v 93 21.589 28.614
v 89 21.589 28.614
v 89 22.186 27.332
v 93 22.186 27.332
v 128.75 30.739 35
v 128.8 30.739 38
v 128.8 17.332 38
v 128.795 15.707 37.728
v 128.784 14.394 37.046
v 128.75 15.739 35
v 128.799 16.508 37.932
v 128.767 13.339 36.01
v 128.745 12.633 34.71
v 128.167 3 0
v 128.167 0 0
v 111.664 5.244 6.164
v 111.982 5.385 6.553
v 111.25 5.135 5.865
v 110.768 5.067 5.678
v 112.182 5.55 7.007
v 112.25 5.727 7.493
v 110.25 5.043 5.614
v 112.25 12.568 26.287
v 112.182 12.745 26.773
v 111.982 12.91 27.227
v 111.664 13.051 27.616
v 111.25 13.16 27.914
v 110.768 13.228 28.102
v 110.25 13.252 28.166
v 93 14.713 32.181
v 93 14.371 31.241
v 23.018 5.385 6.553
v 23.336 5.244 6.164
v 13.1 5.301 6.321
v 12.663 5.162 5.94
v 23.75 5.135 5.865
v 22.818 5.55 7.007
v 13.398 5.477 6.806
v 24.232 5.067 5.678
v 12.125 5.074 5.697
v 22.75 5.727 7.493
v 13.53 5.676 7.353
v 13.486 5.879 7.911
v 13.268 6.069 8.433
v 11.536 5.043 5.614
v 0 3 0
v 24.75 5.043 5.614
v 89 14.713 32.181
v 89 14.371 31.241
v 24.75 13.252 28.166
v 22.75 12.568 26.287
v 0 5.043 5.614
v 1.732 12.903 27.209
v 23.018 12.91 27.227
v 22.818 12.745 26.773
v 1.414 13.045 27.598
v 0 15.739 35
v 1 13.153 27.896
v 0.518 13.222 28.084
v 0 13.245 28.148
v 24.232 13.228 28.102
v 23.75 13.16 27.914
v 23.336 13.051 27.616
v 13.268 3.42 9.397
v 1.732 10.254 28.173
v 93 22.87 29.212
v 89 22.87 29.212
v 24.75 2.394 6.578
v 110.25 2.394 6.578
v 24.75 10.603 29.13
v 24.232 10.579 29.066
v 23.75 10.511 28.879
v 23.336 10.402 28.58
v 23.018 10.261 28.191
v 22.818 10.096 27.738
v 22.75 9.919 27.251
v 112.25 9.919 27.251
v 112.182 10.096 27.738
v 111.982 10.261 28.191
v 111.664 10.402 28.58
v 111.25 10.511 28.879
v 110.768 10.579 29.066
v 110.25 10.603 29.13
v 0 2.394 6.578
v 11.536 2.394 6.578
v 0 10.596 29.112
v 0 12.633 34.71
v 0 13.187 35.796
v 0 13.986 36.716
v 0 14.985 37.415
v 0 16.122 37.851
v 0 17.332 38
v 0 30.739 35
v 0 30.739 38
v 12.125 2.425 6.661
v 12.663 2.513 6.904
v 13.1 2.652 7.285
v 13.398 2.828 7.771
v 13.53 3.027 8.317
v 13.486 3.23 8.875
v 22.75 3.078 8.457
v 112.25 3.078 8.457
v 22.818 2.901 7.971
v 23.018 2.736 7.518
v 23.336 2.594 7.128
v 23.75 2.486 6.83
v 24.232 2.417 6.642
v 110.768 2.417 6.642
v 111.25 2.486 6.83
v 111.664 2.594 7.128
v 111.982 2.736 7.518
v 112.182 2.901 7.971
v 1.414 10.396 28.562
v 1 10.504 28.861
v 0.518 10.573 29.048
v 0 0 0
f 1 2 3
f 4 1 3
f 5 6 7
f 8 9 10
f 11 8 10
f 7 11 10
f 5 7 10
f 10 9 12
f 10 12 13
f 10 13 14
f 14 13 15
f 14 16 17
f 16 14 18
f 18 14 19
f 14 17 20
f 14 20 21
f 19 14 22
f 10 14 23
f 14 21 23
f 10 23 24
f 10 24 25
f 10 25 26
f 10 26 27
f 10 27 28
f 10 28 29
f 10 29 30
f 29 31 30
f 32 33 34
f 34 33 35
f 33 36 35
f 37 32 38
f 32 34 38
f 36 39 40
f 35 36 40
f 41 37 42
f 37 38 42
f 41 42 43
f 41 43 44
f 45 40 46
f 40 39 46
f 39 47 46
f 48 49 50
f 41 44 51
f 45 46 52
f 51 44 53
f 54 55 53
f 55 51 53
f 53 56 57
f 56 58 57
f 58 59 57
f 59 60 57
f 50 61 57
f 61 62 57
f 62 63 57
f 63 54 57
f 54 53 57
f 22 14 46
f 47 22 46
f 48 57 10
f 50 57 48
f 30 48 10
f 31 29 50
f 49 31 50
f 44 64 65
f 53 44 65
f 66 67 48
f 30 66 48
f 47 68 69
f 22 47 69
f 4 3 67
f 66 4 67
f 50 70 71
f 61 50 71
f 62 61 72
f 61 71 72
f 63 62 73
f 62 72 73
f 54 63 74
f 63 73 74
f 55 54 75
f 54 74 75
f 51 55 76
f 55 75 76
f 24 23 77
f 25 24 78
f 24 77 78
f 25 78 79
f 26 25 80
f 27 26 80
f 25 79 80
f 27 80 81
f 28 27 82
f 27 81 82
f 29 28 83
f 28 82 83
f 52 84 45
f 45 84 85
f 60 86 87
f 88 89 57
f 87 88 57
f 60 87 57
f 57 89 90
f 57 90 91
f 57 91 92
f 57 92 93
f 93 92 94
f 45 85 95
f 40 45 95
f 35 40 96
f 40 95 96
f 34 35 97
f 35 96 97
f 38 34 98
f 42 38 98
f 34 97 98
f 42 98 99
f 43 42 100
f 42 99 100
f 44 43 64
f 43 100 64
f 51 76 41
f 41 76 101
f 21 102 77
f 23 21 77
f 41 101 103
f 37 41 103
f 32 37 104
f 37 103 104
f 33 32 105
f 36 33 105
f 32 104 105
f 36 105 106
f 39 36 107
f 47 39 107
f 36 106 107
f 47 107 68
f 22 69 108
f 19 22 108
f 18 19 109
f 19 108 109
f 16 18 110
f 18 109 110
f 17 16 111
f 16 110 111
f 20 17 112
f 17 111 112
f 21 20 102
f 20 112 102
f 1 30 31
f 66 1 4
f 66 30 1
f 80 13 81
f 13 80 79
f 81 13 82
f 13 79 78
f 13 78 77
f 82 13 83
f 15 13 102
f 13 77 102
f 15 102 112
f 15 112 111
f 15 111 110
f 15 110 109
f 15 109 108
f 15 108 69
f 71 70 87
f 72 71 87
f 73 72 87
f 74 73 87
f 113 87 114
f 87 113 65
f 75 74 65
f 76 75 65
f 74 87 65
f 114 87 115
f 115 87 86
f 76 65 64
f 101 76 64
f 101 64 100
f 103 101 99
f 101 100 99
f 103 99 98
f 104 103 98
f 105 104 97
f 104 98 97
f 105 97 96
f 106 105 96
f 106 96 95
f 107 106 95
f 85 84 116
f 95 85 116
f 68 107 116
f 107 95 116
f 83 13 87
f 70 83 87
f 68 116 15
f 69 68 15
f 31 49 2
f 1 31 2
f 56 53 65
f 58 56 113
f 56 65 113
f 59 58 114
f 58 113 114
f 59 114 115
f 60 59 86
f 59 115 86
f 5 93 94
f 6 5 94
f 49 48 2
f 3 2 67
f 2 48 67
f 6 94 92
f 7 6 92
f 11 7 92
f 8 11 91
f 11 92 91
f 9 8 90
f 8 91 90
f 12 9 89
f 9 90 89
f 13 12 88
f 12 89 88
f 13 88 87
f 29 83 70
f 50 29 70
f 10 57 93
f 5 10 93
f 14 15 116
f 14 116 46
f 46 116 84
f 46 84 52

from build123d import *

# Parameters (mm, degrees)
F1_DEPTH = 129
F3_DEPTH = 25
F5_DEPTH = 40
F8_DEPTH = 4


# Not quite as in the source:
# - a feature names something its author has since deleted; it is built from what else it names


with BuildPart() as f1:
    # F0 (on Right) → F1 (new body)
    with BuildSketch(Plane.YZ):
        with BuildLine():
            Line((12.6334434892, 34.7101007166), (0, 0))
            Line((0, 0), (3, 0))
            Line((3, 0), (15.7389581993, 35))
            Line((15.7389581993, 35), (30.7389581993, 35))
            Line((30.7389581993, 35), (30.7389581993, 38))
            Line((30.7389581993, 38), (17.3319065932, 38))
            ThreePointArc((17.3319065932, 38), (14.4640244114, 37.0957602214), (12.6334434892, 34.7101007166))
        make_face()
    extrude(amount=F1_DEPTH)

    # F2 (on face) → F3 (cut)
    with BuildSketch(Plane(origin=(0, 0, 0), x_dir=(1, 0, 0), z_dir=(0, -0.9396926208, 0.3420201433))):
        with BuildLine():
            Line((24.75, 7), (110.25, 7))
            ThreePointArc((110.25, 7), (111.6642135624, 7.5857864376), (112.25, 9))
            Line((112.25, 9), (112.25, 29))
            ThreePointArc((112.25, 29), (111.6642135624, 30.4142135624), (110.25, 31))
            Line((110.25, 31), (24.75, 31))
            ThreePointArc((24.75, 31), (23.3357864376, 30.4142135624), (22.75, 29))
            Line((22.75, 29), (22.75, 9))
            ThreePointArc((22.75, 9), (23.3357864376, 7.5857864376), (24.75, 7))
        make_face()
        with BuildLine():
            ThreePointArc((-13.2679491924, 10), (-13.2679491924, 8), (-11.5358983849, 7))
            Line((-11.5358983849, 7), (0, 7))
            Line((0, 7), (0, 30.9807621135))
            ThreePointArc((0, 30.9807621135), (-1, 30.7128129211), (-1.7320508076, 29.9807621135))
            Line((-1.7320508076, 29.9807621135), (-13.2679491924, 10))
        make_face()
        with BuildLine():
            Line((0, 30.9807621135), (0, 7))
            Line((0, 7), (11.5358983849, 7))
            ThreePointArc((11.5358983849, 7), (13.2679491924, 8), (13.2679491924, 10))
            Line((13.2679491924, 10), (1.7320508076, 29.9807621135))
            ThreePointArc((1.7320508076, 29.9807621135), (1, 30.7128129211), (0, 30.9807621135))
        make_face()
    extrude(amount=-F3_DEPTH, mode=Mode.SUBTRACT)

    # F4 (on Front) → F5 (cut)
    with BuildSketch(Plane.XZ):
        Polygon((149, 50), (129, 50), (128, -10), (149, -10), align=None)
    extrude(amount=-F5_DEPTH, mode=Mode.SUBTRACT)

    # F7 (on offset) → F8 (join)
    with BuildSketch(Plane.YZ.offset(89)):
        Polygon((22.8702962437, 29.2118719039), (13.4733700358, 32.6320733372), (13.1313498925, 31.6923807164), (21.5885834796, 28.6141994265), (22.186255957, 27.3324866624), align=None)
    extrude(amount=F8_DEPTH)


solid = f1.part
